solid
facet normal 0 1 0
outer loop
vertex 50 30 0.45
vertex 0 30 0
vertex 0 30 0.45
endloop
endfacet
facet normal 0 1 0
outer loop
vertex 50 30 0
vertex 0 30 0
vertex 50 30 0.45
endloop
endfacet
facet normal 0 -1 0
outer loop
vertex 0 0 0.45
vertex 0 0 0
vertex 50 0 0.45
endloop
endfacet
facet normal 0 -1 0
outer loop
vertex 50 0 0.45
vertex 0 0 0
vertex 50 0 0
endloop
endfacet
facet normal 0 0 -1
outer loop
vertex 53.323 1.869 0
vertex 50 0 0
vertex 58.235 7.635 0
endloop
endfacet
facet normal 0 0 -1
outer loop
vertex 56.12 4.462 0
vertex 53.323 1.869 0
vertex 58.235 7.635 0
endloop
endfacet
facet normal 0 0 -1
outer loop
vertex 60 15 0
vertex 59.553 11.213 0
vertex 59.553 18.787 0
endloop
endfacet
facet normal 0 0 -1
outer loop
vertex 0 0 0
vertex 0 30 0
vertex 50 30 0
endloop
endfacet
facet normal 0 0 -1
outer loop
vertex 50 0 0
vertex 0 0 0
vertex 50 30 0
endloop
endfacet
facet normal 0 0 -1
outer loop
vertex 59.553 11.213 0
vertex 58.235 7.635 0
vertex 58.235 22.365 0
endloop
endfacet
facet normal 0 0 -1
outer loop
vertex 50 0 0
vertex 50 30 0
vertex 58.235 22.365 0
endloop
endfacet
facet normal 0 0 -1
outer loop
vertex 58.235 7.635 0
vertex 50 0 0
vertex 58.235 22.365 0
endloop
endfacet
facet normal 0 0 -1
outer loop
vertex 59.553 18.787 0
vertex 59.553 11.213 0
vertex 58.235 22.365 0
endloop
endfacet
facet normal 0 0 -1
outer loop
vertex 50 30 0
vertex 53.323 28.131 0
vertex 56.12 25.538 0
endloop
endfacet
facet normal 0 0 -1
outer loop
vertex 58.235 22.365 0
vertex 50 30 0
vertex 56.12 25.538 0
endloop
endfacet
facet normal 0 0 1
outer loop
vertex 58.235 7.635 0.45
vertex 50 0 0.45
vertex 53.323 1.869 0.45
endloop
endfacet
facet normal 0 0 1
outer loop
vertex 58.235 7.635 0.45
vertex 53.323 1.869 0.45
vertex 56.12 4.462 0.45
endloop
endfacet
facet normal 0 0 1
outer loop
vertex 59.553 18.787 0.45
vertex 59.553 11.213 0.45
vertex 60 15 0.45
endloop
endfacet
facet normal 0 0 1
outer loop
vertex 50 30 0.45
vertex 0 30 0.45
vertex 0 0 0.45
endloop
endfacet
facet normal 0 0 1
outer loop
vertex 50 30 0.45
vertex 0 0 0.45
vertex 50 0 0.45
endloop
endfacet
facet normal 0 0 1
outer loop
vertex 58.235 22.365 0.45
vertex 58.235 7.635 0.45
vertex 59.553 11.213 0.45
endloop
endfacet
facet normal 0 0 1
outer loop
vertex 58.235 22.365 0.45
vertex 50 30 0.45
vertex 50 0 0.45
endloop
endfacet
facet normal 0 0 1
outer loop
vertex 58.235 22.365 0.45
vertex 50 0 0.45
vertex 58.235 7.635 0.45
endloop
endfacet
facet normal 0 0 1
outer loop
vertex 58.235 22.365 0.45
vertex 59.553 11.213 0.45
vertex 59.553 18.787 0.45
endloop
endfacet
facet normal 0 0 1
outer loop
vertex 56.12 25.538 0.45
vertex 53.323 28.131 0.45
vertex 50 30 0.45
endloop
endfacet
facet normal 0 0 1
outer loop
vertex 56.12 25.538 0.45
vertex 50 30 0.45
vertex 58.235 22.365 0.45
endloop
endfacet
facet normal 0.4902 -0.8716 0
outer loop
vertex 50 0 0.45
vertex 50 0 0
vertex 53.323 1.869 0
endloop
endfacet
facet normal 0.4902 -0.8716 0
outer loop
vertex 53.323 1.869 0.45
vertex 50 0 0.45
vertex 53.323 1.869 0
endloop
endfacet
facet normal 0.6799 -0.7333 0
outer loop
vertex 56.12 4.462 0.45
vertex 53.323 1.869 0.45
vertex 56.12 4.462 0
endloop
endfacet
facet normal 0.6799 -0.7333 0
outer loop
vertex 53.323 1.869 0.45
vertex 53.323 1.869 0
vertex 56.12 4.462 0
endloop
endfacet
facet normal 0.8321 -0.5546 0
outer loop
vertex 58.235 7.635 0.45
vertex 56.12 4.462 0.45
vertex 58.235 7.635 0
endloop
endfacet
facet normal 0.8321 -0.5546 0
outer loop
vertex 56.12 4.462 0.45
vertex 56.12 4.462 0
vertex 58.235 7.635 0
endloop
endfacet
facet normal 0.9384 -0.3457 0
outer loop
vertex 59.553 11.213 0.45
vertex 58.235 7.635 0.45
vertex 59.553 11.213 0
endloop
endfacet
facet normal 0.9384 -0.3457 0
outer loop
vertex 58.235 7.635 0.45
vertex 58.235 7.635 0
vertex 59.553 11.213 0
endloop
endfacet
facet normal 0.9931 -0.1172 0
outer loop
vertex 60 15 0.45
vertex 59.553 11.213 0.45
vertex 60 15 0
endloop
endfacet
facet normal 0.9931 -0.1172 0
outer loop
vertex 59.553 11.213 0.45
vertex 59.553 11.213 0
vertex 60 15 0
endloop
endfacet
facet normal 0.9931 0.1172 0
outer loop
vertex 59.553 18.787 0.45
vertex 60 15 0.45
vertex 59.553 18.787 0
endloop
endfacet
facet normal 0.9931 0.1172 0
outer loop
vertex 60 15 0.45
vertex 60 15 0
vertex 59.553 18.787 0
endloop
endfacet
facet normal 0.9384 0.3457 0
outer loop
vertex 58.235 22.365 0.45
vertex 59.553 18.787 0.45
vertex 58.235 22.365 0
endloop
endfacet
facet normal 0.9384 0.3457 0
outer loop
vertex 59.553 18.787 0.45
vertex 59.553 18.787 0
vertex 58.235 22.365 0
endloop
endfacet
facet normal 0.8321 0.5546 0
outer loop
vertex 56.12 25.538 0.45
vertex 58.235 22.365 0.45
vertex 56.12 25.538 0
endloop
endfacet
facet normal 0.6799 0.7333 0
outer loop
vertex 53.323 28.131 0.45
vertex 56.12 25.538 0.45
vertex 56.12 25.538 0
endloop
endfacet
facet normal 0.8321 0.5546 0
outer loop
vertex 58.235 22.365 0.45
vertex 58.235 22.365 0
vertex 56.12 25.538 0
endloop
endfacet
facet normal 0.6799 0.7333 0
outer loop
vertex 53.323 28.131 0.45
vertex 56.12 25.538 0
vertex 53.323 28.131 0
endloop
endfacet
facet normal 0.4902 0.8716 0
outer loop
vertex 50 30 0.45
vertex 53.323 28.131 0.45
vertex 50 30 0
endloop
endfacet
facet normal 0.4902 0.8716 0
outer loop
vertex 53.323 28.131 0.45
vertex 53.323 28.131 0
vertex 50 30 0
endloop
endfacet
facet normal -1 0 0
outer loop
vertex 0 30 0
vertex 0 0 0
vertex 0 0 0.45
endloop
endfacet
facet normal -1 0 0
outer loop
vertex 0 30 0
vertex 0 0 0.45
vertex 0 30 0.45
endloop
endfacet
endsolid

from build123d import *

# Parameters (mm, degrees)
F0_W     = 50
F0_H     = 30
F1_DEPTH = 0.45


with BuildPart() as f1:
    # F0 (on Top) → F1 (new body)
    with BuildSketch(Plane.XY):
        with Locations((25, 15)):
            Rectangle(F0_W, F0_H)
        with BuildLine():
            Line((50, 30), (50, 0))
            ThreePointArc((50, 0), (60, 15), (50, 30))
        make_face()
    extrude(amount=F1_DEPTH)


with BuildPart() as f2_1:
    # F2: copy of F1
    add(f1.part)


solid = f1.part
